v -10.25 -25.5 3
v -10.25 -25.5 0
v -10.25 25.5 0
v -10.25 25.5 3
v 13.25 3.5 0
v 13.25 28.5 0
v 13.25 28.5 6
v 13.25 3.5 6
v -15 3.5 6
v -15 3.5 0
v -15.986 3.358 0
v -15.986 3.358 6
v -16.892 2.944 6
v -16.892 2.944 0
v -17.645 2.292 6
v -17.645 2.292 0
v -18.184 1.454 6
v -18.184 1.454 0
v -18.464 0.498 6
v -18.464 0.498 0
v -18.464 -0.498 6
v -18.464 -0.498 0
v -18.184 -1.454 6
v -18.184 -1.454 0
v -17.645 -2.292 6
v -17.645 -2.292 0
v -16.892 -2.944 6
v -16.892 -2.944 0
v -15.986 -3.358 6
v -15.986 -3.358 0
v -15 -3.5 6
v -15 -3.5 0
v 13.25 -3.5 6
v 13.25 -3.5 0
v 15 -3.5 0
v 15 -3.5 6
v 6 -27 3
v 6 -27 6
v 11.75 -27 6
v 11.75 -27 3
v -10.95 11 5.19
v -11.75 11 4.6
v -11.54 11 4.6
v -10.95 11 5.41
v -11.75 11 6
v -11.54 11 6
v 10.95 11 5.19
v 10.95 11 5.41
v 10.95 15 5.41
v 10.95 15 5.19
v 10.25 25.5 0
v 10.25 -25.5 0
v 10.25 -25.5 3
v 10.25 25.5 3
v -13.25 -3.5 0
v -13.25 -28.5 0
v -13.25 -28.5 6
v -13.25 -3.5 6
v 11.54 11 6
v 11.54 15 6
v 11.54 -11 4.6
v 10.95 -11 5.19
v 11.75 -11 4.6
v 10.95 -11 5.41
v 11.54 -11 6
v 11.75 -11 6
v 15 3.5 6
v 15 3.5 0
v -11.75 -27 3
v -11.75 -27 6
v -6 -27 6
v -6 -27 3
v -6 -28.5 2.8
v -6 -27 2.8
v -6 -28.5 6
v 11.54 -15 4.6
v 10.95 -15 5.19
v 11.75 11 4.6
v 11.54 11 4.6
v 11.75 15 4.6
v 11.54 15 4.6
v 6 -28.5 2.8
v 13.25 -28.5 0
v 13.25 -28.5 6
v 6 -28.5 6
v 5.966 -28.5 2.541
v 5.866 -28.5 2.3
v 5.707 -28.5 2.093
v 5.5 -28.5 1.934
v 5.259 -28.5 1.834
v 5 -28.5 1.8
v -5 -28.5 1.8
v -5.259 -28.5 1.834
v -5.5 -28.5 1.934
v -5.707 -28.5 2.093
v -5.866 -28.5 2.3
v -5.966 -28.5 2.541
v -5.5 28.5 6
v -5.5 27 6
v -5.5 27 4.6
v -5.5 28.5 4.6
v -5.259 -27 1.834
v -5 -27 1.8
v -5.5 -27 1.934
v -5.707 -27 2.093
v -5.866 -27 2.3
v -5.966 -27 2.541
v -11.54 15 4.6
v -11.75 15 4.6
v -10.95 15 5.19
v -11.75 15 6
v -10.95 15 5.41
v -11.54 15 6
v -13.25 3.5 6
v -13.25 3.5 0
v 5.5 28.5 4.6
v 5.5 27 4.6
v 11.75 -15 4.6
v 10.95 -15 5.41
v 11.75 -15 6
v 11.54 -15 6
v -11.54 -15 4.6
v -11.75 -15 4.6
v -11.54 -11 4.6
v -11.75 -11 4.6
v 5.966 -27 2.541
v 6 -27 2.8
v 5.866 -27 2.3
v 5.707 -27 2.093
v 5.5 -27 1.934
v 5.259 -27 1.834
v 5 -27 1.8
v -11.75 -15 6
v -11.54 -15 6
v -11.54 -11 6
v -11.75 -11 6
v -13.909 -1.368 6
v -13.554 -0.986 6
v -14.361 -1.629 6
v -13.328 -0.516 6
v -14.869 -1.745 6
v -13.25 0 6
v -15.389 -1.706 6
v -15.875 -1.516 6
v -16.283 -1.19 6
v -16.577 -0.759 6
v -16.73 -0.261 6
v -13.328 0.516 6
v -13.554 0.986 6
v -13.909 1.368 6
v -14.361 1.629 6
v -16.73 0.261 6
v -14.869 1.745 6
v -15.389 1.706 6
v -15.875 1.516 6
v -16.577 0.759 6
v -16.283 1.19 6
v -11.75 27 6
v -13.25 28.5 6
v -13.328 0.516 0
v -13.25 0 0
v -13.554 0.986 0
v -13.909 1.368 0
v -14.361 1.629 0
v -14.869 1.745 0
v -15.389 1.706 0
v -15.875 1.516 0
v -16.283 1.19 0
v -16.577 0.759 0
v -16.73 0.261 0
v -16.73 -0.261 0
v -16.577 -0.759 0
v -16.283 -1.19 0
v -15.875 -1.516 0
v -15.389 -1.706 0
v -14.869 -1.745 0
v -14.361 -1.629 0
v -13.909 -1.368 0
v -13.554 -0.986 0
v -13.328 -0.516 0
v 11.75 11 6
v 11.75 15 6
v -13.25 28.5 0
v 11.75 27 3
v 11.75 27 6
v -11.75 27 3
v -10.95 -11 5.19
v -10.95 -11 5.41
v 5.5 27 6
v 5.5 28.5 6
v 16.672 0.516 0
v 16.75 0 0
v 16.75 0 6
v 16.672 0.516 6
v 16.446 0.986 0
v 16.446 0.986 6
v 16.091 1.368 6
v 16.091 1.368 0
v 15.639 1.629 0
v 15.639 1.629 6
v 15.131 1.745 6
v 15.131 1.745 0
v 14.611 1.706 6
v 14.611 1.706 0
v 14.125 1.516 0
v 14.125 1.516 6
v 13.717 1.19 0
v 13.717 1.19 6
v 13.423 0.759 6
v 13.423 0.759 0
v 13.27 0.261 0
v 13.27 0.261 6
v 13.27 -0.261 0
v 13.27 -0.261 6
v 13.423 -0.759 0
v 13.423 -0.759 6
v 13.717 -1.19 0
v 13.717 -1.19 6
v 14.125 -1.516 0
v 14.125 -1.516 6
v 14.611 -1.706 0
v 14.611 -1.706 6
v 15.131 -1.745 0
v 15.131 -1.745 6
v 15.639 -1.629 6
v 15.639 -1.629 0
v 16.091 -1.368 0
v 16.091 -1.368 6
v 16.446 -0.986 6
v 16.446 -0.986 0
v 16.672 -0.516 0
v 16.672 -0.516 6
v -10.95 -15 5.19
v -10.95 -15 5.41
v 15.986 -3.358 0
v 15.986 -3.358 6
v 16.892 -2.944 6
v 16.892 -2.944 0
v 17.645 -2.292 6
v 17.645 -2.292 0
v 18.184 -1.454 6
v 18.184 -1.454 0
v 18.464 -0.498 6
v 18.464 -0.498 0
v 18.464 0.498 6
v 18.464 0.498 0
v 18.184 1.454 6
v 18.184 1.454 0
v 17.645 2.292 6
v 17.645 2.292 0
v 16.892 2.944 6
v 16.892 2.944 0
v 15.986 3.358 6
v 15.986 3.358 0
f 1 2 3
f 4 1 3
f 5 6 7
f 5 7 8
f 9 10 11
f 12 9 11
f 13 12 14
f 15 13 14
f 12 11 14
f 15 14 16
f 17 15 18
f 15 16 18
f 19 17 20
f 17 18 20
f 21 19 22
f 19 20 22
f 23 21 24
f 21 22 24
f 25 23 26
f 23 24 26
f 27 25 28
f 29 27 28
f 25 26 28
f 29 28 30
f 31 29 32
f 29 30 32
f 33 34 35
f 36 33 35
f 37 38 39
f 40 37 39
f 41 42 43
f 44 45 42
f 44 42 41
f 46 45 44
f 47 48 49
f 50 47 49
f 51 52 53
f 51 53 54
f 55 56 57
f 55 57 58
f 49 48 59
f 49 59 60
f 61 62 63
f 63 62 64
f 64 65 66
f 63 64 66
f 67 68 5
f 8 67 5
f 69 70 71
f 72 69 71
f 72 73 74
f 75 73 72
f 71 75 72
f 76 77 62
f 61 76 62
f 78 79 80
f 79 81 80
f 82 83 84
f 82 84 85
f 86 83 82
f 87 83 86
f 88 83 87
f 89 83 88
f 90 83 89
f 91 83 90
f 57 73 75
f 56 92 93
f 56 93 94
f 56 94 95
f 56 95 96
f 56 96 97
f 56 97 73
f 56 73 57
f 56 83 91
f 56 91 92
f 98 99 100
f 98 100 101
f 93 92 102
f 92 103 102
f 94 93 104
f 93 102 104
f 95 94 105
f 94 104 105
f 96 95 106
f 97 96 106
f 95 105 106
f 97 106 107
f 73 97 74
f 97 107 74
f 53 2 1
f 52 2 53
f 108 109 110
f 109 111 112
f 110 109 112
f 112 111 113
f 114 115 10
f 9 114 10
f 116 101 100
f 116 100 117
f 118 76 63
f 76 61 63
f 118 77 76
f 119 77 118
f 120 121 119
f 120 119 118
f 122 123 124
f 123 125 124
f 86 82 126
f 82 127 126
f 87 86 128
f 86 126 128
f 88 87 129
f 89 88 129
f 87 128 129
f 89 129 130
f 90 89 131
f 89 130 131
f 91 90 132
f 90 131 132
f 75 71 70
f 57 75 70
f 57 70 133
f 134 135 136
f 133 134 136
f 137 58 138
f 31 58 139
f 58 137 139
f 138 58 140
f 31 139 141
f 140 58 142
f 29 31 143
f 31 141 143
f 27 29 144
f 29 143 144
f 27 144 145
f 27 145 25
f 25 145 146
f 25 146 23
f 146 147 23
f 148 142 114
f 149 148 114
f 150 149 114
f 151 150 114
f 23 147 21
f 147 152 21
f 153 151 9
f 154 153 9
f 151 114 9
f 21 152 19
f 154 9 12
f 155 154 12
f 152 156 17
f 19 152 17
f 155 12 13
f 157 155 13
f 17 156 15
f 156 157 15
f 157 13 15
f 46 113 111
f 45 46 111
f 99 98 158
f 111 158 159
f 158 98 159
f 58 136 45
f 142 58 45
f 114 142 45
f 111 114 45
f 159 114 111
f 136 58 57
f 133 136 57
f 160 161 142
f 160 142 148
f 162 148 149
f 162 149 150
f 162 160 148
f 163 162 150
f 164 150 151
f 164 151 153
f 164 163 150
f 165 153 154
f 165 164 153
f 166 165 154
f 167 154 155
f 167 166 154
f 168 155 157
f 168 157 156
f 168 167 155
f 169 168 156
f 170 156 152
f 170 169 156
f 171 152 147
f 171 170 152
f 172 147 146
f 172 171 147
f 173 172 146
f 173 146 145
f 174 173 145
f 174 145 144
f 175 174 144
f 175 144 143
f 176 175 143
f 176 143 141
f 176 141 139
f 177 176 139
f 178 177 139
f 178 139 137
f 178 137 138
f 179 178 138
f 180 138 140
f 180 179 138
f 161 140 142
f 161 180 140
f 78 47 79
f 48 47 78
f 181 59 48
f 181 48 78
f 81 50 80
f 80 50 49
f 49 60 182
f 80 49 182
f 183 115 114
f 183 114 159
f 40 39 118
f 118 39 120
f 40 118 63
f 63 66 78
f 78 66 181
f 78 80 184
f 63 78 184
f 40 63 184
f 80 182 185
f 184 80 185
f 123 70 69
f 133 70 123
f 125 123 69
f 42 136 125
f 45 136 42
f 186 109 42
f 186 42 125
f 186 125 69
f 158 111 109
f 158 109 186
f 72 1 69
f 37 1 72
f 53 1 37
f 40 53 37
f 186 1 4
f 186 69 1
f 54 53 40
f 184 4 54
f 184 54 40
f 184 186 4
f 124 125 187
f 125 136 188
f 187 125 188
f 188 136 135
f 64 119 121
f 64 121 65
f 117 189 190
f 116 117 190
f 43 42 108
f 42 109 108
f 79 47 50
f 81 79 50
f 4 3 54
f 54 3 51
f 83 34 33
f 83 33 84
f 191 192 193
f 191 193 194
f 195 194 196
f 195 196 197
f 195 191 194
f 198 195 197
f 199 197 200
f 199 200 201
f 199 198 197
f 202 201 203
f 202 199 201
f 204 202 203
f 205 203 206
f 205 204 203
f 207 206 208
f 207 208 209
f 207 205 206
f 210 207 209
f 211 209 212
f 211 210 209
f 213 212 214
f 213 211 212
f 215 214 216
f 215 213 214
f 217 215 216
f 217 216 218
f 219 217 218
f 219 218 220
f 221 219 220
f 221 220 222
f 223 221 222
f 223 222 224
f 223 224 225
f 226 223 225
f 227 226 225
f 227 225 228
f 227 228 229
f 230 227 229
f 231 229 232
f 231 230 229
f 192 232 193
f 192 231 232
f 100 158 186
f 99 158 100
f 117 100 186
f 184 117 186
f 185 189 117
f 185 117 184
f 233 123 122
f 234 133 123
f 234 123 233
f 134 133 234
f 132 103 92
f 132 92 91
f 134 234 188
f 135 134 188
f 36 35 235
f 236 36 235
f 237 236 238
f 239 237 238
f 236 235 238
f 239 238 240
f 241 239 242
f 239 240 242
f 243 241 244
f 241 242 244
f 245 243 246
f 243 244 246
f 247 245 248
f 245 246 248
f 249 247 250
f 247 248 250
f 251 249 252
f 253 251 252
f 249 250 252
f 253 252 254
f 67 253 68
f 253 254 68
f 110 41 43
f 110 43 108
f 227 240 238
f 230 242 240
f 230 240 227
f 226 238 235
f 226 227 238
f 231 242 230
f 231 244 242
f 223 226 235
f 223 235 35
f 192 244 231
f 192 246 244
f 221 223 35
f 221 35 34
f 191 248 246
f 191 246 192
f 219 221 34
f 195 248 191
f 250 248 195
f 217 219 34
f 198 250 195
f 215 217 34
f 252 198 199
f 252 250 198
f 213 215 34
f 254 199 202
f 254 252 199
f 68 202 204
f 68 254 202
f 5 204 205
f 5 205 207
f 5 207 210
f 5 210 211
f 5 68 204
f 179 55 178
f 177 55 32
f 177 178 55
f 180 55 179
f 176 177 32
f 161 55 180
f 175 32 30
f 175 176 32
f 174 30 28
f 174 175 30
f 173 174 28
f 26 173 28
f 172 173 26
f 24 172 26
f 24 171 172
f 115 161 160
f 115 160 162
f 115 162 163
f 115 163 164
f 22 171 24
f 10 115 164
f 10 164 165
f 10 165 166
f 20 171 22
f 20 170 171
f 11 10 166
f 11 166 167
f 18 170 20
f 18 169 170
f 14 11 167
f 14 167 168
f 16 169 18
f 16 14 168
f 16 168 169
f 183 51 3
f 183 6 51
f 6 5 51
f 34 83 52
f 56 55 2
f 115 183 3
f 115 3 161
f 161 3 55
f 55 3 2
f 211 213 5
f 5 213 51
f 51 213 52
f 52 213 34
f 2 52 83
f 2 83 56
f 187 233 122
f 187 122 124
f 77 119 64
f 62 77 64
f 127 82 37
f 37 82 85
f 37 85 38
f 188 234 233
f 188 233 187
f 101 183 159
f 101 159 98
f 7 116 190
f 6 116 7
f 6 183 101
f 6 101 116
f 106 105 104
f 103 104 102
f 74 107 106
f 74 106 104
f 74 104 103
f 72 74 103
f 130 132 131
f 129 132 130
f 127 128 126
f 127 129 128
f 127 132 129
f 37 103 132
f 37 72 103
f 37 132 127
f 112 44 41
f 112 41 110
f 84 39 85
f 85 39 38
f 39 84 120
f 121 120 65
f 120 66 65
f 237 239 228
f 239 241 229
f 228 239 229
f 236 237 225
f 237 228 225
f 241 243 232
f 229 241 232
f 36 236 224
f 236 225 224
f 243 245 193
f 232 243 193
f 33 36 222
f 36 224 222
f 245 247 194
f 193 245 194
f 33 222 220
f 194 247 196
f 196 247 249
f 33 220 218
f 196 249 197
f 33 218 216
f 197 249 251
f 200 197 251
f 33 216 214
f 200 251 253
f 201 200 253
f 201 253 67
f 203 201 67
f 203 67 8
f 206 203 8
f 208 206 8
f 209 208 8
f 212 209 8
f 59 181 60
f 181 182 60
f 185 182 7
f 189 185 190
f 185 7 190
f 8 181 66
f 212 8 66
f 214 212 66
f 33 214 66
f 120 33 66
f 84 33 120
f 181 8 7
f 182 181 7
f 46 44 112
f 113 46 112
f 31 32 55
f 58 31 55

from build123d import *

# Parameters (mm, degrees)
SKETCH_R        = 1.75
SKETCH_W        = 20.5
SKETCH_H        = 51
PAD_DEPTH       = 6
SKETCH001_W     = 23.5
SKETCH001_H     = 54
POCKET_DEPTH    = 3
SKETCH002_W     = 0.8
SKETCH002_H     = 4
PAD001_DEPTH    = 1.4
CHAMFER_SIZE    = 0.59
SKETCH003_W     = 12
SKETCH003_H     = 2
POCKET001_DEPTH = 4.2
SKETCH004_W     = 11
SKETCH004_H     = 2
POCKET002_DEPTH = 1.4
FILLET_R        = 1


with BuildPart() as part:
    # Sketch → Pad (new body)
    with BuildSketch(Plane.XY):
        with BuildLine():
            Line((-13.25, 28.5), (13.25, 28.5))
            Line((13.25, 28.5), (13.25, 3.5))
            Line((15, 3.5), (13.25, 3.5))
            ThreePointArc((15, -3.5), (18.5, 0), (15, 3.5))
            Line((13.25, -3.5), (15, -3.5))
            Line((13.25, -3.5), (13.25, -28.5))
            Line((13.25, -28.5), (-13.25, -28.5))
            Line((-13.25, -28.5), (-13.25, -3.5))
            Line((-15, -3.5), (-13.25, -3.5))
            ThreePointArc((-15, 3.5), (-18.5, 0), (-15, -3.5))
            Line((-13.25, 3.5), (-15, 3.5))
            Line((-13.25, 3.5), (-13.25, 28.5))
        make_face()
        with Locations((-15, 0)):
            Circle(SKETCH_R, mode=Mode.SUBTRACT)
        with Locations((15, 0)):
            Circle(SKETCH_R, mode=Mode.SUBTRACT)
        Rectangle(SKETCH_W, SKETCH_H, mode=Mode.SUBTRACT)
    extrude(amount=PAD_DEPTH)

    # Sketch001 (on Face20 of Pad) → Pocket (cut)
    with BuildSketch(Plane.XY.offset(6)):
        Rectangle(SKETCH001_W, SKETCH001_H)
    extrude(amount=-POCKET_DEPTH, mode=Mode.SUBTRACT)

    # Sketch002 (on Face5 of Pocket) → Pad001 (join)
    with BuildSketch(Plane.XY.offset(6)):
        with Locations((-11.35, 13)):
            Rectangle(SKETCH002_W, SKETCH002_H)
        with Locations((-11.35, -13)):
            Rectangle(SKETCH002_W, SKETCH002_H)
        with Locations((11.35, -13)):
            Rectangle(SKETCH002_W, SKETCH002_H)
        with Locations((11.35, 13)):
            Rectangle(SKETCH002_W, SKETCH002_H)
    extrude(amount=-PAD001_DEPTH)

    # Chamfer
    chamfer_edges = [part.edges().sort_by_distance(p)[0] for p in [
        (-10.95, -13, 4.6),
        (-10.95, -13, 6),
        (-10.95, 13, 4.6),
        (-10.95, 13, 6),
        (10.95, 13, 6),
        (10.95, 13, 4.6),
        (10.95, -13, 6),
        (10.95, -13, 4.6),
    ]]
    chamfer(chamfer_edges, length=CHAMFER_SIZE)

    # Sketch003 (on Face4 of Chamfer) → Pocket001 (cut)
    with BuildSketch(Plane.XY.offset(6)):
        with Locations((0, -28)):
            Rectangle(SKETCH003_W, SKETCH003_H)
    extrude(amount=-POCKET001_DEPTH, mode=Mode.SUBTRACT)

    # Sketch004 (on Face4 of Pocket001) → Pocket002 (cut)
    with BuildSketch(Plane.XY.offset(6)):
        with Locations((0, 28)):
            Rectangle(SKETCH004_W, SKETCH004_H)
    extrude(amount=-POCKET002_DEPTH, mode=Mode.SUBTRACT)

    # Fillet
    fillet_edges = [part.edges().sort_by_distance(p)[0] for p in [
        (-6, -27.75, 1.8),
        (6, -27.75, 1.8),
    ]]
    fillet(fillet_edges, radius=FILLET_R)


solid = part.part
